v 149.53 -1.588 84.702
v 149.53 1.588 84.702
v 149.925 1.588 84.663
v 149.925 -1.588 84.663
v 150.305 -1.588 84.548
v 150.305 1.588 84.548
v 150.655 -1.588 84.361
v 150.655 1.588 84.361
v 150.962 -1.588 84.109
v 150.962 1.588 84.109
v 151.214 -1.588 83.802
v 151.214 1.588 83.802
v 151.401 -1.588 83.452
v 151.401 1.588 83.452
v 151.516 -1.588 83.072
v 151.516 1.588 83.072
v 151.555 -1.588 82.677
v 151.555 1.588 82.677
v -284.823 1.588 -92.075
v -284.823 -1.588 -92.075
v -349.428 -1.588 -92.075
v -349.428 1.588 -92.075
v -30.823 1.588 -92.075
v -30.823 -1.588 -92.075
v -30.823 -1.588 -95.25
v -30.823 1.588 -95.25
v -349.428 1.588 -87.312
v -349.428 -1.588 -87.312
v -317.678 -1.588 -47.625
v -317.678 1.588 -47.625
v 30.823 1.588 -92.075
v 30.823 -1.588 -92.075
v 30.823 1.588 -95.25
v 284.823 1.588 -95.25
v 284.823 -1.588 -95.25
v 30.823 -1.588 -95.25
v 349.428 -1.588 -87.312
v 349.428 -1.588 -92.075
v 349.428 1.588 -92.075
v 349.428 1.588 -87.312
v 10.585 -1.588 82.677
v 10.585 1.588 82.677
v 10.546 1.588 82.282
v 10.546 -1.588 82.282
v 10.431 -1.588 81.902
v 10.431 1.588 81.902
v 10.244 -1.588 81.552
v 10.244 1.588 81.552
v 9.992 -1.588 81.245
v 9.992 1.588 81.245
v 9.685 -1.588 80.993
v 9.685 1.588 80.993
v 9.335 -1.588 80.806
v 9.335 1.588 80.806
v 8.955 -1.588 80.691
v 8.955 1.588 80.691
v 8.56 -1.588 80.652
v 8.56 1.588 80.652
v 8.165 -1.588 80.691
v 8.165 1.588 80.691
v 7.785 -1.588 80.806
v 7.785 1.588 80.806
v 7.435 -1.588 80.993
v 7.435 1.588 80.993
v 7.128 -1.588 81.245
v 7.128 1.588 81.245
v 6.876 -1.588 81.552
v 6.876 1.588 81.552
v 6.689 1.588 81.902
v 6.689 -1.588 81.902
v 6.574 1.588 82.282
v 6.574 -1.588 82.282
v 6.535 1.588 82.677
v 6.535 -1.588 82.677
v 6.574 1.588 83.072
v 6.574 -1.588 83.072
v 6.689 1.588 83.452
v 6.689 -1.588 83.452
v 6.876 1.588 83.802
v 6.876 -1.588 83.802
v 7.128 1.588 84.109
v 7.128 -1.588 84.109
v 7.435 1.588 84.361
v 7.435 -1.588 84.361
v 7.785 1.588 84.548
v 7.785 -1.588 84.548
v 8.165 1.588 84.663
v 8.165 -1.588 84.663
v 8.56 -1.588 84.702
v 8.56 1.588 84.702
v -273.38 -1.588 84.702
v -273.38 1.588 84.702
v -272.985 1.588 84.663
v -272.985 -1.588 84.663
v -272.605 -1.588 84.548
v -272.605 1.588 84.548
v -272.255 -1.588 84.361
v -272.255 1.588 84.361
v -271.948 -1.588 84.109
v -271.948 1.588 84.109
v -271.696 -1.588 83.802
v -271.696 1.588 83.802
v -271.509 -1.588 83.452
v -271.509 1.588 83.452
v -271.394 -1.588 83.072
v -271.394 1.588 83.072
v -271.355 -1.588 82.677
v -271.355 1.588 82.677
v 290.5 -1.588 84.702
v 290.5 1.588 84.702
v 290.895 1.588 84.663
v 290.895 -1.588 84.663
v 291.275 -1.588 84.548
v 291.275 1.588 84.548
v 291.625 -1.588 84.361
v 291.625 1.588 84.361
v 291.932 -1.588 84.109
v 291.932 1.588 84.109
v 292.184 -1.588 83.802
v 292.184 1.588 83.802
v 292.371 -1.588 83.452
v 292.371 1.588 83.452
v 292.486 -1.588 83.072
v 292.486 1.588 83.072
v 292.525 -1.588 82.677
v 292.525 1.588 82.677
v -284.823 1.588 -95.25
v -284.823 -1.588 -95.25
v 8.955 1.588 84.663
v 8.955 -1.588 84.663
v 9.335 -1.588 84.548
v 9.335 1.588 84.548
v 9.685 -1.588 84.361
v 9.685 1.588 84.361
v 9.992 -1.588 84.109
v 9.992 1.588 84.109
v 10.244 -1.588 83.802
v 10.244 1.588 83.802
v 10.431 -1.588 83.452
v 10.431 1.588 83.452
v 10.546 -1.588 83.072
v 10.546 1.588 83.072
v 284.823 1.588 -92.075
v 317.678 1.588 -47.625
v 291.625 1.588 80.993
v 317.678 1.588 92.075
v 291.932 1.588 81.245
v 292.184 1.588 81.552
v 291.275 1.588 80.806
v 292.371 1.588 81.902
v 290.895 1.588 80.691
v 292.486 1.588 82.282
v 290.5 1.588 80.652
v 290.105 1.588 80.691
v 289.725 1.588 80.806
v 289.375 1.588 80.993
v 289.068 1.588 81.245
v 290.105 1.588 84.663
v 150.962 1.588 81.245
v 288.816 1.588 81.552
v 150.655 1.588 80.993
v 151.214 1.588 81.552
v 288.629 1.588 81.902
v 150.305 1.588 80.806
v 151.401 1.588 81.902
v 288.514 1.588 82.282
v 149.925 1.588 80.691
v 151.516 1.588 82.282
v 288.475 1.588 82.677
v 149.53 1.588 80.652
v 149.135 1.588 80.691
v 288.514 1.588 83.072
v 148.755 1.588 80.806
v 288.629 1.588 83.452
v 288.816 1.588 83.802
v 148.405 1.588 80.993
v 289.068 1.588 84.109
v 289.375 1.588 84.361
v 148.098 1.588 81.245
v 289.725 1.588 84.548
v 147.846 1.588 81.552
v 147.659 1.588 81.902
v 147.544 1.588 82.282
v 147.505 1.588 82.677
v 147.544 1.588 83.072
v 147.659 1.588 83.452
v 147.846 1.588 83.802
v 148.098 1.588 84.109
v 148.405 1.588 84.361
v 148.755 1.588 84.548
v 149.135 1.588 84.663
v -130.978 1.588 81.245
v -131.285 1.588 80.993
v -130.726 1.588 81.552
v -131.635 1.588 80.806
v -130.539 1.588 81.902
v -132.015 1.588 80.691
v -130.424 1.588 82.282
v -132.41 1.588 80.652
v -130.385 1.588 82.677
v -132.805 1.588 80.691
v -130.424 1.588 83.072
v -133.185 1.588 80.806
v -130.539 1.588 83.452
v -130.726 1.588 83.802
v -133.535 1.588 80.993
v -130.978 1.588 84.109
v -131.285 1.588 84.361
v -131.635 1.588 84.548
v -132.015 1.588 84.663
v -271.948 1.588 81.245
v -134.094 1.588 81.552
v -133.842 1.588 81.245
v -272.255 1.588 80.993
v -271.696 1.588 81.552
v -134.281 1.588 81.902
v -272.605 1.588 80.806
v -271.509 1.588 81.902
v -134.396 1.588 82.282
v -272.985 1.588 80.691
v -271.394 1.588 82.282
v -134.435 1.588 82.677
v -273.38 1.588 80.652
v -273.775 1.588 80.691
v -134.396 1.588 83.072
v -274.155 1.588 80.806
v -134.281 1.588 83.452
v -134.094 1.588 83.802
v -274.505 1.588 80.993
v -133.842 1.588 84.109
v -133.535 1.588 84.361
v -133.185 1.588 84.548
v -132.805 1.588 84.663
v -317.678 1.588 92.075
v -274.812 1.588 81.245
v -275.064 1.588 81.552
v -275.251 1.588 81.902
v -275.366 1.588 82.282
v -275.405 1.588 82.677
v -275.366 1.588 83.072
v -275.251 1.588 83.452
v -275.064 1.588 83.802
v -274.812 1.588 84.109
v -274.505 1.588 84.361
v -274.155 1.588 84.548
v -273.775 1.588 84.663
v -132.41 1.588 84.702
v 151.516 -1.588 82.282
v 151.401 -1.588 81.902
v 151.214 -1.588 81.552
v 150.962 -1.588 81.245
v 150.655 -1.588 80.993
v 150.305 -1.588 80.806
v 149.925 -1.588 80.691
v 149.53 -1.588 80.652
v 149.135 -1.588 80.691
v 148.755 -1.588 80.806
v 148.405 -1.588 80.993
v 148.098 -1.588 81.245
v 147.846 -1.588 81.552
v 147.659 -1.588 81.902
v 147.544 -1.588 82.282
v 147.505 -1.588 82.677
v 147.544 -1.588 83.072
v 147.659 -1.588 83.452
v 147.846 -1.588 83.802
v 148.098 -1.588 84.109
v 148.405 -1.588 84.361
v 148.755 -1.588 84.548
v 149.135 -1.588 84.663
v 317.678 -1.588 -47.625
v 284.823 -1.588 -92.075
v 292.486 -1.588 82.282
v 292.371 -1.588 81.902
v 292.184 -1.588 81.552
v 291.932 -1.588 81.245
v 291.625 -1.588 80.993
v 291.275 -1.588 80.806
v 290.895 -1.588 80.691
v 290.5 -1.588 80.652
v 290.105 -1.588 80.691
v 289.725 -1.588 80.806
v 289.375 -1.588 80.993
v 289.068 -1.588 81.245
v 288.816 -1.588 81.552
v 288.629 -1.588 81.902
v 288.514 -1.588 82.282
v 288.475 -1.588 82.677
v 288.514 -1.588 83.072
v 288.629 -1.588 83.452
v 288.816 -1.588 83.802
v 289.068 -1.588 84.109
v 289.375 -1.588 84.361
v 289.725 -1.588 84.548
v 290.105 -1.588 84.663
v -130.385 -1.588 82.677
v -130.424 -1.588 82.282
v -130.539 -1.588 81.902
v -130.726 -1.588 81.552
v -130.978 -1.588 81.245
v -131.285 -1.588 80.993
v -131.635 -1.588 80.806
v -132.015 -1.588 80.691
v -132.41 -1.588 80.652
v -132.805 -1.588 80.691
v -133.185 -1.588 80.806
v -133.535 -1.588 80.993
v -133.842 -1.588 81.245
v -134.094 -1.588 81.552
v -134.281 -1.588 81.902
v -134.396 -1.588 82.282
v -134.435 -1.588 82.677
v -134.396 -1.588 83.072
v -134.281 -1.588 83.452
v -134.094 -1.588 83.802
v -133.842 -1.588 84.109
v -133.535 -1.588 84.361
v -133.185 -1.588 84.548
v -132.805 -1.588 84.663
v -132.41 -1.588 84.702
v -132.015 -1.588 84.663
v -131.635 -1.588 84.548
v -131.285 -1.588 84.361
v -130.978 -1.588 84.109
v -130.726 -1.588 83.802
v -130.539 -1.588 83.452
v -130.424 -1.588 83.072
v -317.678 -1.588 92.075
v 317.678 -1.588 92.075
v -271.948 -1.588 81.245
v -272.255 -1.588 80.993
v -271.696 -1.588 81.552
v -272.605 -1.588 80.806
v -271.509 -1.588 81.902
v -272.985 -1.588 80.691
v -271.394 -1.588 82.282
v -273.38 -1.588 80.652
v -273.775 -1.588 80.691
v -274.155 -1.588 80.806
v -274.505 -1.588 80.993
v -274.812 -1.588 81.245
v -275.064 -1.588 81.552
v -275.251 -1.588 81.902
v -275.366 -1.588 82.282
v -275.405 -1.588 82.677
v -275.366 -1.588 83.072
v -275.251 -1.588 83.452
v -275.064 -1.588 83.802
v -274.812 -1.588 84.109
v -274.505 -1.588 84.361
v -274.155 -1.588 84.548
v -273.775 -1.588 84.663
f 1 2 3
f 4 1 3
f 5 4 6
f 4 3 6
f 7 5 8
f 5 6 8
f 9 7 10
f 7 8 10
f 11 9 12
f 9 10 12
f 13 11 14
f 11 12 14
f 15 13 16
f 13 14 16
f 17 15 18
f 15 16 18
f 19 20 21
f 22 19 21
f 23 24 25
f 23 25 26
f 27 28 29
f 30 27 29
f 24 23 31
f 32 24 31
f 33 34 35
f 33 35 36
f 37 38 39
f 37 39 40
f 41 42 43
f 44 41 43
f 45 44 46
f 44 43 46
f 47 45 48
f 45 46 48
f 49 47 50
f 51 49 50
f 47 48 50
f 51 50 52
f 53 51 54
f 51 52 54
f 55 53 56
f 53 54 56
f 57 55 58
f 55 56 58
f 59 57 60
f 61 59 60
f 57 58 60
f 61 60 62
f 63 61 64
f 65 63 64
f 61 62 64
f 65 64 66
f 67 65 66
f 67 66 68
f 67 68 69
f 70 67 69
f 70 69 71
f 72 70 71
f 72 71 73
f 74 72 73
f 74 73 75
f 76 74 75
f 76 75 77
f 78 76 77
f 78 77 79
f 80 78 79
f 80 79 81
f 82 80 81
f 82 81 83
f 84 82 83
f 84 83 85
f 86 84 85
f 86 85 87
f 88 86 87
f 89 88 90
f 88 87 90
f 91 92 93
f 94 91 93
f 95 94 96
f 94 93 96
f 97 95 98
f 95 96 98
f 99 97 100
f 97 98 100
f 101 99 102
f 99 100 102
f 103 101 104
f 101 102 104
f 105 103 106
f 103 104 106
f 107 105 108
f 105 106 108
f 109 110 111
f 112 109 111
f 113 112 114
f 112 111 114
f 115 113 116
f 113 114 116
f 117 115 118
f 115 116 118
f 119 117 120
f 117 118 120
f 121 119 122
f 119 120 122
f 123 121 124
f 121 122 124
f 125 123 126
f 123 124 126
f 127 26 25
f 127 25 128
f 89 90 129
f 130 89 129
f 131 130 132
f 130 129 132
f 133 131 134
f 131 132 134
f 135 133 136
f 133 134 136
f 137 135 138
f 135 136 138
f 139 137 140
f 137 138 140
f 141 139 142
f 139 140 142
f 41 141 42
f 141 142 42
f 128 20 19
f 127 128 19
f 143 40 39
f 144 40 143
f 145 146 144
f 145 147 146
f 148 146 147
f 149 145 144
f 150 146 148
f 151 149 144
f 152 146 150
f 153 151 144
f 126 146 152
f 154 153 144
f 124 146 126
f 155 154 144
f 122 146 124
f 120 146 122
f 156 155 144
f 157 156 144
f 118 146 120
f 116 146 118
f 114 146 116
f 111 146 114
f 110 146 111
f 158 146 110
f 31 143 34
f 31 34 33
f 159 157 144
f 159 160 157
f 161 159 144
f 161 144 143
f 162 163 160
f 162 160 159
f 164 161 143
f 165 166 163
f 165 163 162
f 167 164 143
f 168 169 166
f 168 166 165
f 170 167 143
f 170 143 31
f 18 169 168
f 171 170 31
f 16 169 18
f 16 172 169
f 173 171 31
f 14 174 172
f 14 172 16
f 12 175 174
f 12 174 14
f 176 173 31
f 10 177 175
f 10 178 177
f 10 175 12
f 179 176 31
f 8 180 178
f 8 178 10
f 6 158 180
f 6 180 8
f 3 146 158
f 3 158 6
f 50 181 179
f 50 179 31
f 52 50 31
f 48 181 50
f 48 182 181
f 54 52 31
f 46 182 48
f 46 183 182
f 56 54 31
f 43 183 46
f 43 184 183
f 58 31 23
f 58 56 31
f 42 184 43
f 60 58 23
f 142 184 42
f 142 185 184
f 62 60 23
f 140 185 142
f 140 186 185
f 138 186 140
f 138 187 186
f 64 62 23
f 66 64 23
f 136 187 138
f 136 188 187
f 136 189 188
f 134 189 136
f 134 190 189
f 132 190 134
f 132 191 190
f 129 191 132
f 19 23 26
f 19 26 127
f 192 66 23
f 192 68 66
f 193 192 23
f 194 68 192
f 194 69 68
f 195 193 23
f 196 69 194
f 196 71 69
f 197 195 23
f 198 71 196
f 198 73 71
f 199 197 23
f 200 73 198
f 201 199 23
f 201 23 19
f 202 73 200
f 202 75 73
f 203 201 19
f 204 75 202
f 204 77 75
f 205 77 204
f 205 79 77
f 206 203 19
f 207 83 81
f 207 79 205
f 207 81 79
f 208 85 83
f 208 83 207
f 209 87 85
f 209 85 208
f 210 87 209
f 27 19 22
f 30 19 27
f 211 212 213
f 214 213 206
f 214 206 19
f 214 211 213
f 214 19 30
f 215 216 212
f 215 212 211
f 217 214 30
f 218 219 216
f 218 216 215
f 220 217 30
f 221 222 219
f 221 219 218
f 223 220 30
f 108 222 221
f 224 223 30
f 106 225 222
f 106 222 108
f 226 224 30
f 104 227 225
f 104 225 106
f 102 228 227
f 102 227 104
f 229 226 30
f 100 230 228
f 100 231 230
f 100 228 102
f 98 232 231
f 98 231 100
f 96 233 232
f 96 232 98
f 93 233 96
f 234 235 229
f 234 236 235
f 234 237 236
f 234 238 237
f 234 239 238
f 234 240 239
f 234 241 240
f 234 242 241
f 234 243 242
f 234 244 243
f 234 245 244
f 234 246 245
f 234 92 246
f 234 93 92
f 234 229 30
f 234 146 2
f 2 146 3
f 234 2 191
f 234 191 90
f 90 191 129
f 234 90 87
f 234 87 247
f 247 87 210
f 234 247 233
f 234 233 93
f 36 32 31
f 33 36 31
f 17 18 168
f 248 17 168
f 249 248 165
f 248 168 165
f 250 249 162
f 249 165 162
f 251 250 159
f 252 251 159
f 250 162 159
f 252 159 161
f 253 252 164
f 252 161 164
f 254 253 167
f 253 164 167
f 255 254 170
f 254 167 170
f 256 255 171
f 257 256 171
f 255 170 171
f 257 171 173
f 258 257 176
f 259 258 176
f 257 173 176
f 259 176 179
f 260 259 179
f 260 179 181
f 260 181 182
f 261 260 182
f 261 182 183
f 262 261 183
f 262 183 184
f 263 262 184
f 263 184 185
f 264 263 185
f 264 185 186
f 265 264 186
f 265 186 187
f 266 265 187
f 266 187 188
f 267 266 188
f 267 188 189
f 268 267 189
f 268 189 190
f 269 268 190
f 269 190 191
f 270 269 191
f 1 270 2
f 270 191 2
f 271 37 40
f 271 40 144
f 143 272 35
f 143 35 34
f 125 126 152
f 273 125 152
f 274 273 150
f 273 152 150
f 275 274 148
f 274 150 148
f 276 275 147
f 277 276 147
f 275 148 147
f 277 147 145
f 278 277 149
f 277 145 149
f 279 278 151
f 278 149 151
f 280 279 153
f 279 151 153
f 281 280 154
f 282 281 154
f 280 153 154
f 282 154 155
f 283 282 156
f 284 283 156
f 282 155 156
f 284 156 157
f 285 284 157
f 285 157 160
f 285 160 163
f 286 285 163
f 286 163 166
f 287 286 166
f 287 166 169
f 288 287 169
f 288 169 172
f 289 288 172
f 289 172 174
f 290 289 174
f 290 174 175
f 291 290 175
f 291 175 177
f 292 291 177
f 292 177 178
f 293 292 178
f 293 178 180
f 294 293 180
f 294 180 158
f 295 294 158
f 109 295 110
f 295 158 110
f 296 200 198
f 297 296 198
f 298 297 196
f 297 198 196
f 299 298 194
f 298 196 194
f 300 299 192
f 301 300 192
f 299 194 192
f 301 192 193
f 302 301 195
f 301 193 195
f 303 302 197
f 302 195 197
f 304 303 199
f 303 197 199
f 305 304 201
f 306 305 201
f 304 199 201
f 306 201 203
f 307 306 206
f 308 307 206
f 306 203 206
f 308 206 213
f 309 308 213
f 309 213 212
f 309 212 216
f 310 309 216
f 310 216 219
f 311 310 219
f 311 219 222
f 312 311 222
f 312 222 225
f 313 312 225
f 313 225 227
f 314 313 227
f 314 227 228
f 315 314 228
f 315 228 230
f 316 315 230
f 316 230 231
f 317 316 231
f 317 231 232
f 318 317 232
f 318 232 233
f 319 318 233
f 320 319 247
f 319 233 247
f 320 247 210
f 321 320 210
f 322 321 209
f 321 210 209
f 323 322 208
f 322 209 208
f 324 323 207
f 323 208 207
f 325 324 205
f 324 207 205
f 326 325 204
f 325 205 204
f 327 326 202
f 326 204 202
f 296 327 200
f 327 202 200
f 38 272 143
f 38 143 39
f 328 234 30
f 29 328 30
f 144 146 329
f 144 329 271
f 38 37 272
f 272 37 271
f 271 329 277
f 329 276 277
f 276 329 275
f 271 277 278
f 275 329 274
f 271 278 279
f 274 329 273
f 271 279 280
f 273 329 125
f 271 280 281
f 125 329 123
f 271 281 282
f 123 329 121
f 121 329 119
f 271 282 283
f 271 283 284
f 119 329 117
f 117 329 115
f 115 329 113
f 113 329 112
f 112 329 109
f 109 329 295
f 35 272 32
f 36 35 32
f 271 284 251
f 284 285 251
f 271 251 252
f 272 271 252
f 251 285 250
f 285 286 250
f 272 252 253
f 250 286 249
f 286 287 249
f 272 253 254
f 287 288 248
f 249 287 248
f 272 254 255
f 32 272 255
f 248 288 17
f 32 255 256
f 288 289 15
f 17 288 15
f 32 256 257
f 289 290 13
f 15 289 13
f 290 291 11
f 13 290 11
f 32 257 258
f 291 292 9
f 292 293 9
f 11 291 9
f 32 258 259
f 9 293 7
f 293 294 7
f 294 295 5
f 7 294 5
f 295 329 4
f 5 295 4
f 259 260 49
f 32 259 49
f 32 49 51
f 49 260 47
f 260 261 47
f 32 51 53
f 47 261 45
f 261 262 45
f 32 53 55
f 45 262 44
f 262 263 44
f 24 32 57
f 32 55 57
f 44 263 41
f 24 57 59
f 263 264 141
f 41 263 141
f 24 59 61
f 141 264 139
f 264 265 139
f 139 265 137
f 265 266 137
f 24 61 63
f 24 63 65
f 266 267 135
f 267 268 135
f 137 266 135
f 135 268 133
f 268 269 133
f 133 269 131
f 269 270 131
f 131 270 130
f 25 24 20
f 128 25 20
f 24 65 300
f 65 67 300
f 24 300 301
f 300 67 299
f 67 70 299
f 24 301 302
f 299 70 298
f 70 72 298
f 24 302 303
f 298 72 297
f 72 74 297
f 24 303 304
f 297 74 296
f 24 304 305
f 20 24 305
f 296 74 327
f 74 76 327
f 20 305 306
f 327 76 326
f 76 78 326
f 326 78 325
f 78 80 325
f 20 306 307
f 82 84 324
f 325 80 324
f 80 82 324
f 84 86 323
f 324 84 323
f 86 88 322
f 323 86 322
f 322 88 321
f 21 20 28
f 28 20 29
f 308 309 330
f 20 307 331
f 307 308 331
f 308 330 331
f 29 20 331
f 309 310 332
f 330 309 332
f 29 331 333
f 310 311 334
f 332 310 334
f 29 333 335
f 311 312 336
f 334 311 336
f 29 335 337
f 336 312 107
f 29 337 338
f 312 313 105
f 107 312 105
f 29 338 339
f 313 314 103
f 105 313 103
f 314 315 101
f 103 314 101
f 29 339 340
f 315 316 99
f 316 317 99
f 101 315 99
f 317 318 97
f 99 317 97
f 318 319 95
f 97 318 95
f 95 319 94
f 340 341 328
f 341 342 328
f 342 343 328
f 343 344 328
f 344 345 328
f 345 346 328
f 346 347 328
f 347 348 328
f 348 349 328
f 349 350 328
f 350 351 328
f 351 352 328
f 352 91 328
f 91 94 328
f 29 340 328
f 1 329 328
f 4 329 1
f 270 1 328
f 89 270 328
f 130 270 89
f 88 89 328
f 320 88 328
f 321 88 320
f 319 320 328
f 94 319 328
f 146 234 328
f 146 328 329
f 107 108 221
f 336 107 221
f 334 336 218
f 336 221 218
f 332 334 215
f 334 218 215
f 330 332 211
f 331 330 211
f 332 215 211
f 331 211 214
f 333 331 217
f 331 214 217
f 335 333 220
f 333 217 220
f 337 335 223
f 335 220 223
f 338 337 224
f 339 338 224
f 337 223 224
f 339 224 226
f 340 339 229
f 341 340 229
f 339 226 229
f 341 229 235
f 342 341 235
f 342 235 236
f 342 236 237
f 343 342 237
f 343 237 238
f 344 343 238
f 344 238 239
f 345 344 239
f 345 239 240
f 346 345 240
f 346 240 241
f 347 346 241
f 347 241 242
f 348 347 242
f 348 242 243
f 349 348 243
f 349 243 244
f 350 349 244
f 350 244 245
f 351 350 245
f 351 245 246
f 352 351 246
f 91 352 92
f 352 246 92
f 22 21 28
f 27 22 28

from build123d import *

# Parameters (mm, degrees)
SKETCH1_W           = 635.3556
SKETCH1_H           = 184.15
BOSS_EXTRUDE1_DEPTH = 1.5875
SKETCH2_W           = 254
SKETCH2_H           = 3.175
BOSS_EXTRUDE2_DEPTH = 3.175
BOSS_EXTRUDE3_DEPTH = 3.175
CUT_EXTRUDE1_DEPTH  = 10
LPATTERN1_COUNT     = 5
LPATTERN1_PITCH     = 140.97


with BuildPart() as part:
    # Sketch1 → Boss-Extrude1 (new, symmetric)
    with BuildSketch(Plane(origin=(0, 0, 0), x_dir=(1, 0, 0), z_dir=(0, 1, 0))):
        Rectangle(SKETCH1_W, SKETCH1_H)
    extrude(amount=BOSS_EXTRUDE1_DEPTH, both=True)

    # Sketch2 → Boss-Extrude2 (add)
    with BuildSketch(Plane(origin=(0, 0, -92.075), x_dir=(-1, 0, 0), z_dir=(0, 0, -1))):
        with Locations((-157.8229, 0)):
            Rectangle(SKETCH2_W, SKETCH2_H)
        with Locations((157.8229, 0)):
            Rectangle(SKETCH2_W, SKETCH2_H)
    extrude(amount=BOSS_EXTRUDE2_DEPTH)

    # Sketch3 → Boss-Extrude3 (add)
    with BuildSketch(Plane.XZ.offset(1.5875)):
        Polygon((317.6778, -92.075), (349.4278, -92.075), (349.4278, -87.3125), (317.6778, -47.625), align=None)
    boss_extrude3 = extrude(amount=-BOSS_EXTRUDE3_DEPTH)

    # Mirror1: Boss-Extrude3 across plane
    add(boss_extrude3.mirror(Plane(origin=(0, 0, 0), x_dir=(0, 0, 1), z_dir=(1, 0, 0))))

    # Sketch4 → Cut-Extrude1 (cut)
    with BuildSketch(Plane(origin=(0, 1.5875, 0), x_dir=(1, 0, 0), z_dir=(0, 1, 0))):
        with BuildLine():
            ThreePointArc((292.5248, -82.677), (289.067908768, -81.245108768), (290.4998, -84.702))
            Line((290.4998, -84.702), (290.4998, -82.677))
            Line((290.4998, -82.677), (292.5248, -82.677))
        make_face()
        with BuildLine():
            Line((290.4998, -82.677), (290.4998, -84.702))
            ThreePointArc((290.4998, -84.702), (291.931691232, -84.108891232), (292.5248, -82.677))
            Line((292.5248, -82.677), (290.4998, -82.677))
        make_face()
    cut_extrude1 = extrude(amount=-CUT_EXTRUDE1_DEPTH, mode=Mode.SUBTRACT)

    # LPattern1: Cut-Extrude1 ×5
    with Locations(*[(-i * LPATTERN1_PITCH, 0, 0) for i in range(1, LPATTERN1_COUNT)]):
        add(cut_extrude1, mode=Mode.SUBTRACT)


solid = part.part
